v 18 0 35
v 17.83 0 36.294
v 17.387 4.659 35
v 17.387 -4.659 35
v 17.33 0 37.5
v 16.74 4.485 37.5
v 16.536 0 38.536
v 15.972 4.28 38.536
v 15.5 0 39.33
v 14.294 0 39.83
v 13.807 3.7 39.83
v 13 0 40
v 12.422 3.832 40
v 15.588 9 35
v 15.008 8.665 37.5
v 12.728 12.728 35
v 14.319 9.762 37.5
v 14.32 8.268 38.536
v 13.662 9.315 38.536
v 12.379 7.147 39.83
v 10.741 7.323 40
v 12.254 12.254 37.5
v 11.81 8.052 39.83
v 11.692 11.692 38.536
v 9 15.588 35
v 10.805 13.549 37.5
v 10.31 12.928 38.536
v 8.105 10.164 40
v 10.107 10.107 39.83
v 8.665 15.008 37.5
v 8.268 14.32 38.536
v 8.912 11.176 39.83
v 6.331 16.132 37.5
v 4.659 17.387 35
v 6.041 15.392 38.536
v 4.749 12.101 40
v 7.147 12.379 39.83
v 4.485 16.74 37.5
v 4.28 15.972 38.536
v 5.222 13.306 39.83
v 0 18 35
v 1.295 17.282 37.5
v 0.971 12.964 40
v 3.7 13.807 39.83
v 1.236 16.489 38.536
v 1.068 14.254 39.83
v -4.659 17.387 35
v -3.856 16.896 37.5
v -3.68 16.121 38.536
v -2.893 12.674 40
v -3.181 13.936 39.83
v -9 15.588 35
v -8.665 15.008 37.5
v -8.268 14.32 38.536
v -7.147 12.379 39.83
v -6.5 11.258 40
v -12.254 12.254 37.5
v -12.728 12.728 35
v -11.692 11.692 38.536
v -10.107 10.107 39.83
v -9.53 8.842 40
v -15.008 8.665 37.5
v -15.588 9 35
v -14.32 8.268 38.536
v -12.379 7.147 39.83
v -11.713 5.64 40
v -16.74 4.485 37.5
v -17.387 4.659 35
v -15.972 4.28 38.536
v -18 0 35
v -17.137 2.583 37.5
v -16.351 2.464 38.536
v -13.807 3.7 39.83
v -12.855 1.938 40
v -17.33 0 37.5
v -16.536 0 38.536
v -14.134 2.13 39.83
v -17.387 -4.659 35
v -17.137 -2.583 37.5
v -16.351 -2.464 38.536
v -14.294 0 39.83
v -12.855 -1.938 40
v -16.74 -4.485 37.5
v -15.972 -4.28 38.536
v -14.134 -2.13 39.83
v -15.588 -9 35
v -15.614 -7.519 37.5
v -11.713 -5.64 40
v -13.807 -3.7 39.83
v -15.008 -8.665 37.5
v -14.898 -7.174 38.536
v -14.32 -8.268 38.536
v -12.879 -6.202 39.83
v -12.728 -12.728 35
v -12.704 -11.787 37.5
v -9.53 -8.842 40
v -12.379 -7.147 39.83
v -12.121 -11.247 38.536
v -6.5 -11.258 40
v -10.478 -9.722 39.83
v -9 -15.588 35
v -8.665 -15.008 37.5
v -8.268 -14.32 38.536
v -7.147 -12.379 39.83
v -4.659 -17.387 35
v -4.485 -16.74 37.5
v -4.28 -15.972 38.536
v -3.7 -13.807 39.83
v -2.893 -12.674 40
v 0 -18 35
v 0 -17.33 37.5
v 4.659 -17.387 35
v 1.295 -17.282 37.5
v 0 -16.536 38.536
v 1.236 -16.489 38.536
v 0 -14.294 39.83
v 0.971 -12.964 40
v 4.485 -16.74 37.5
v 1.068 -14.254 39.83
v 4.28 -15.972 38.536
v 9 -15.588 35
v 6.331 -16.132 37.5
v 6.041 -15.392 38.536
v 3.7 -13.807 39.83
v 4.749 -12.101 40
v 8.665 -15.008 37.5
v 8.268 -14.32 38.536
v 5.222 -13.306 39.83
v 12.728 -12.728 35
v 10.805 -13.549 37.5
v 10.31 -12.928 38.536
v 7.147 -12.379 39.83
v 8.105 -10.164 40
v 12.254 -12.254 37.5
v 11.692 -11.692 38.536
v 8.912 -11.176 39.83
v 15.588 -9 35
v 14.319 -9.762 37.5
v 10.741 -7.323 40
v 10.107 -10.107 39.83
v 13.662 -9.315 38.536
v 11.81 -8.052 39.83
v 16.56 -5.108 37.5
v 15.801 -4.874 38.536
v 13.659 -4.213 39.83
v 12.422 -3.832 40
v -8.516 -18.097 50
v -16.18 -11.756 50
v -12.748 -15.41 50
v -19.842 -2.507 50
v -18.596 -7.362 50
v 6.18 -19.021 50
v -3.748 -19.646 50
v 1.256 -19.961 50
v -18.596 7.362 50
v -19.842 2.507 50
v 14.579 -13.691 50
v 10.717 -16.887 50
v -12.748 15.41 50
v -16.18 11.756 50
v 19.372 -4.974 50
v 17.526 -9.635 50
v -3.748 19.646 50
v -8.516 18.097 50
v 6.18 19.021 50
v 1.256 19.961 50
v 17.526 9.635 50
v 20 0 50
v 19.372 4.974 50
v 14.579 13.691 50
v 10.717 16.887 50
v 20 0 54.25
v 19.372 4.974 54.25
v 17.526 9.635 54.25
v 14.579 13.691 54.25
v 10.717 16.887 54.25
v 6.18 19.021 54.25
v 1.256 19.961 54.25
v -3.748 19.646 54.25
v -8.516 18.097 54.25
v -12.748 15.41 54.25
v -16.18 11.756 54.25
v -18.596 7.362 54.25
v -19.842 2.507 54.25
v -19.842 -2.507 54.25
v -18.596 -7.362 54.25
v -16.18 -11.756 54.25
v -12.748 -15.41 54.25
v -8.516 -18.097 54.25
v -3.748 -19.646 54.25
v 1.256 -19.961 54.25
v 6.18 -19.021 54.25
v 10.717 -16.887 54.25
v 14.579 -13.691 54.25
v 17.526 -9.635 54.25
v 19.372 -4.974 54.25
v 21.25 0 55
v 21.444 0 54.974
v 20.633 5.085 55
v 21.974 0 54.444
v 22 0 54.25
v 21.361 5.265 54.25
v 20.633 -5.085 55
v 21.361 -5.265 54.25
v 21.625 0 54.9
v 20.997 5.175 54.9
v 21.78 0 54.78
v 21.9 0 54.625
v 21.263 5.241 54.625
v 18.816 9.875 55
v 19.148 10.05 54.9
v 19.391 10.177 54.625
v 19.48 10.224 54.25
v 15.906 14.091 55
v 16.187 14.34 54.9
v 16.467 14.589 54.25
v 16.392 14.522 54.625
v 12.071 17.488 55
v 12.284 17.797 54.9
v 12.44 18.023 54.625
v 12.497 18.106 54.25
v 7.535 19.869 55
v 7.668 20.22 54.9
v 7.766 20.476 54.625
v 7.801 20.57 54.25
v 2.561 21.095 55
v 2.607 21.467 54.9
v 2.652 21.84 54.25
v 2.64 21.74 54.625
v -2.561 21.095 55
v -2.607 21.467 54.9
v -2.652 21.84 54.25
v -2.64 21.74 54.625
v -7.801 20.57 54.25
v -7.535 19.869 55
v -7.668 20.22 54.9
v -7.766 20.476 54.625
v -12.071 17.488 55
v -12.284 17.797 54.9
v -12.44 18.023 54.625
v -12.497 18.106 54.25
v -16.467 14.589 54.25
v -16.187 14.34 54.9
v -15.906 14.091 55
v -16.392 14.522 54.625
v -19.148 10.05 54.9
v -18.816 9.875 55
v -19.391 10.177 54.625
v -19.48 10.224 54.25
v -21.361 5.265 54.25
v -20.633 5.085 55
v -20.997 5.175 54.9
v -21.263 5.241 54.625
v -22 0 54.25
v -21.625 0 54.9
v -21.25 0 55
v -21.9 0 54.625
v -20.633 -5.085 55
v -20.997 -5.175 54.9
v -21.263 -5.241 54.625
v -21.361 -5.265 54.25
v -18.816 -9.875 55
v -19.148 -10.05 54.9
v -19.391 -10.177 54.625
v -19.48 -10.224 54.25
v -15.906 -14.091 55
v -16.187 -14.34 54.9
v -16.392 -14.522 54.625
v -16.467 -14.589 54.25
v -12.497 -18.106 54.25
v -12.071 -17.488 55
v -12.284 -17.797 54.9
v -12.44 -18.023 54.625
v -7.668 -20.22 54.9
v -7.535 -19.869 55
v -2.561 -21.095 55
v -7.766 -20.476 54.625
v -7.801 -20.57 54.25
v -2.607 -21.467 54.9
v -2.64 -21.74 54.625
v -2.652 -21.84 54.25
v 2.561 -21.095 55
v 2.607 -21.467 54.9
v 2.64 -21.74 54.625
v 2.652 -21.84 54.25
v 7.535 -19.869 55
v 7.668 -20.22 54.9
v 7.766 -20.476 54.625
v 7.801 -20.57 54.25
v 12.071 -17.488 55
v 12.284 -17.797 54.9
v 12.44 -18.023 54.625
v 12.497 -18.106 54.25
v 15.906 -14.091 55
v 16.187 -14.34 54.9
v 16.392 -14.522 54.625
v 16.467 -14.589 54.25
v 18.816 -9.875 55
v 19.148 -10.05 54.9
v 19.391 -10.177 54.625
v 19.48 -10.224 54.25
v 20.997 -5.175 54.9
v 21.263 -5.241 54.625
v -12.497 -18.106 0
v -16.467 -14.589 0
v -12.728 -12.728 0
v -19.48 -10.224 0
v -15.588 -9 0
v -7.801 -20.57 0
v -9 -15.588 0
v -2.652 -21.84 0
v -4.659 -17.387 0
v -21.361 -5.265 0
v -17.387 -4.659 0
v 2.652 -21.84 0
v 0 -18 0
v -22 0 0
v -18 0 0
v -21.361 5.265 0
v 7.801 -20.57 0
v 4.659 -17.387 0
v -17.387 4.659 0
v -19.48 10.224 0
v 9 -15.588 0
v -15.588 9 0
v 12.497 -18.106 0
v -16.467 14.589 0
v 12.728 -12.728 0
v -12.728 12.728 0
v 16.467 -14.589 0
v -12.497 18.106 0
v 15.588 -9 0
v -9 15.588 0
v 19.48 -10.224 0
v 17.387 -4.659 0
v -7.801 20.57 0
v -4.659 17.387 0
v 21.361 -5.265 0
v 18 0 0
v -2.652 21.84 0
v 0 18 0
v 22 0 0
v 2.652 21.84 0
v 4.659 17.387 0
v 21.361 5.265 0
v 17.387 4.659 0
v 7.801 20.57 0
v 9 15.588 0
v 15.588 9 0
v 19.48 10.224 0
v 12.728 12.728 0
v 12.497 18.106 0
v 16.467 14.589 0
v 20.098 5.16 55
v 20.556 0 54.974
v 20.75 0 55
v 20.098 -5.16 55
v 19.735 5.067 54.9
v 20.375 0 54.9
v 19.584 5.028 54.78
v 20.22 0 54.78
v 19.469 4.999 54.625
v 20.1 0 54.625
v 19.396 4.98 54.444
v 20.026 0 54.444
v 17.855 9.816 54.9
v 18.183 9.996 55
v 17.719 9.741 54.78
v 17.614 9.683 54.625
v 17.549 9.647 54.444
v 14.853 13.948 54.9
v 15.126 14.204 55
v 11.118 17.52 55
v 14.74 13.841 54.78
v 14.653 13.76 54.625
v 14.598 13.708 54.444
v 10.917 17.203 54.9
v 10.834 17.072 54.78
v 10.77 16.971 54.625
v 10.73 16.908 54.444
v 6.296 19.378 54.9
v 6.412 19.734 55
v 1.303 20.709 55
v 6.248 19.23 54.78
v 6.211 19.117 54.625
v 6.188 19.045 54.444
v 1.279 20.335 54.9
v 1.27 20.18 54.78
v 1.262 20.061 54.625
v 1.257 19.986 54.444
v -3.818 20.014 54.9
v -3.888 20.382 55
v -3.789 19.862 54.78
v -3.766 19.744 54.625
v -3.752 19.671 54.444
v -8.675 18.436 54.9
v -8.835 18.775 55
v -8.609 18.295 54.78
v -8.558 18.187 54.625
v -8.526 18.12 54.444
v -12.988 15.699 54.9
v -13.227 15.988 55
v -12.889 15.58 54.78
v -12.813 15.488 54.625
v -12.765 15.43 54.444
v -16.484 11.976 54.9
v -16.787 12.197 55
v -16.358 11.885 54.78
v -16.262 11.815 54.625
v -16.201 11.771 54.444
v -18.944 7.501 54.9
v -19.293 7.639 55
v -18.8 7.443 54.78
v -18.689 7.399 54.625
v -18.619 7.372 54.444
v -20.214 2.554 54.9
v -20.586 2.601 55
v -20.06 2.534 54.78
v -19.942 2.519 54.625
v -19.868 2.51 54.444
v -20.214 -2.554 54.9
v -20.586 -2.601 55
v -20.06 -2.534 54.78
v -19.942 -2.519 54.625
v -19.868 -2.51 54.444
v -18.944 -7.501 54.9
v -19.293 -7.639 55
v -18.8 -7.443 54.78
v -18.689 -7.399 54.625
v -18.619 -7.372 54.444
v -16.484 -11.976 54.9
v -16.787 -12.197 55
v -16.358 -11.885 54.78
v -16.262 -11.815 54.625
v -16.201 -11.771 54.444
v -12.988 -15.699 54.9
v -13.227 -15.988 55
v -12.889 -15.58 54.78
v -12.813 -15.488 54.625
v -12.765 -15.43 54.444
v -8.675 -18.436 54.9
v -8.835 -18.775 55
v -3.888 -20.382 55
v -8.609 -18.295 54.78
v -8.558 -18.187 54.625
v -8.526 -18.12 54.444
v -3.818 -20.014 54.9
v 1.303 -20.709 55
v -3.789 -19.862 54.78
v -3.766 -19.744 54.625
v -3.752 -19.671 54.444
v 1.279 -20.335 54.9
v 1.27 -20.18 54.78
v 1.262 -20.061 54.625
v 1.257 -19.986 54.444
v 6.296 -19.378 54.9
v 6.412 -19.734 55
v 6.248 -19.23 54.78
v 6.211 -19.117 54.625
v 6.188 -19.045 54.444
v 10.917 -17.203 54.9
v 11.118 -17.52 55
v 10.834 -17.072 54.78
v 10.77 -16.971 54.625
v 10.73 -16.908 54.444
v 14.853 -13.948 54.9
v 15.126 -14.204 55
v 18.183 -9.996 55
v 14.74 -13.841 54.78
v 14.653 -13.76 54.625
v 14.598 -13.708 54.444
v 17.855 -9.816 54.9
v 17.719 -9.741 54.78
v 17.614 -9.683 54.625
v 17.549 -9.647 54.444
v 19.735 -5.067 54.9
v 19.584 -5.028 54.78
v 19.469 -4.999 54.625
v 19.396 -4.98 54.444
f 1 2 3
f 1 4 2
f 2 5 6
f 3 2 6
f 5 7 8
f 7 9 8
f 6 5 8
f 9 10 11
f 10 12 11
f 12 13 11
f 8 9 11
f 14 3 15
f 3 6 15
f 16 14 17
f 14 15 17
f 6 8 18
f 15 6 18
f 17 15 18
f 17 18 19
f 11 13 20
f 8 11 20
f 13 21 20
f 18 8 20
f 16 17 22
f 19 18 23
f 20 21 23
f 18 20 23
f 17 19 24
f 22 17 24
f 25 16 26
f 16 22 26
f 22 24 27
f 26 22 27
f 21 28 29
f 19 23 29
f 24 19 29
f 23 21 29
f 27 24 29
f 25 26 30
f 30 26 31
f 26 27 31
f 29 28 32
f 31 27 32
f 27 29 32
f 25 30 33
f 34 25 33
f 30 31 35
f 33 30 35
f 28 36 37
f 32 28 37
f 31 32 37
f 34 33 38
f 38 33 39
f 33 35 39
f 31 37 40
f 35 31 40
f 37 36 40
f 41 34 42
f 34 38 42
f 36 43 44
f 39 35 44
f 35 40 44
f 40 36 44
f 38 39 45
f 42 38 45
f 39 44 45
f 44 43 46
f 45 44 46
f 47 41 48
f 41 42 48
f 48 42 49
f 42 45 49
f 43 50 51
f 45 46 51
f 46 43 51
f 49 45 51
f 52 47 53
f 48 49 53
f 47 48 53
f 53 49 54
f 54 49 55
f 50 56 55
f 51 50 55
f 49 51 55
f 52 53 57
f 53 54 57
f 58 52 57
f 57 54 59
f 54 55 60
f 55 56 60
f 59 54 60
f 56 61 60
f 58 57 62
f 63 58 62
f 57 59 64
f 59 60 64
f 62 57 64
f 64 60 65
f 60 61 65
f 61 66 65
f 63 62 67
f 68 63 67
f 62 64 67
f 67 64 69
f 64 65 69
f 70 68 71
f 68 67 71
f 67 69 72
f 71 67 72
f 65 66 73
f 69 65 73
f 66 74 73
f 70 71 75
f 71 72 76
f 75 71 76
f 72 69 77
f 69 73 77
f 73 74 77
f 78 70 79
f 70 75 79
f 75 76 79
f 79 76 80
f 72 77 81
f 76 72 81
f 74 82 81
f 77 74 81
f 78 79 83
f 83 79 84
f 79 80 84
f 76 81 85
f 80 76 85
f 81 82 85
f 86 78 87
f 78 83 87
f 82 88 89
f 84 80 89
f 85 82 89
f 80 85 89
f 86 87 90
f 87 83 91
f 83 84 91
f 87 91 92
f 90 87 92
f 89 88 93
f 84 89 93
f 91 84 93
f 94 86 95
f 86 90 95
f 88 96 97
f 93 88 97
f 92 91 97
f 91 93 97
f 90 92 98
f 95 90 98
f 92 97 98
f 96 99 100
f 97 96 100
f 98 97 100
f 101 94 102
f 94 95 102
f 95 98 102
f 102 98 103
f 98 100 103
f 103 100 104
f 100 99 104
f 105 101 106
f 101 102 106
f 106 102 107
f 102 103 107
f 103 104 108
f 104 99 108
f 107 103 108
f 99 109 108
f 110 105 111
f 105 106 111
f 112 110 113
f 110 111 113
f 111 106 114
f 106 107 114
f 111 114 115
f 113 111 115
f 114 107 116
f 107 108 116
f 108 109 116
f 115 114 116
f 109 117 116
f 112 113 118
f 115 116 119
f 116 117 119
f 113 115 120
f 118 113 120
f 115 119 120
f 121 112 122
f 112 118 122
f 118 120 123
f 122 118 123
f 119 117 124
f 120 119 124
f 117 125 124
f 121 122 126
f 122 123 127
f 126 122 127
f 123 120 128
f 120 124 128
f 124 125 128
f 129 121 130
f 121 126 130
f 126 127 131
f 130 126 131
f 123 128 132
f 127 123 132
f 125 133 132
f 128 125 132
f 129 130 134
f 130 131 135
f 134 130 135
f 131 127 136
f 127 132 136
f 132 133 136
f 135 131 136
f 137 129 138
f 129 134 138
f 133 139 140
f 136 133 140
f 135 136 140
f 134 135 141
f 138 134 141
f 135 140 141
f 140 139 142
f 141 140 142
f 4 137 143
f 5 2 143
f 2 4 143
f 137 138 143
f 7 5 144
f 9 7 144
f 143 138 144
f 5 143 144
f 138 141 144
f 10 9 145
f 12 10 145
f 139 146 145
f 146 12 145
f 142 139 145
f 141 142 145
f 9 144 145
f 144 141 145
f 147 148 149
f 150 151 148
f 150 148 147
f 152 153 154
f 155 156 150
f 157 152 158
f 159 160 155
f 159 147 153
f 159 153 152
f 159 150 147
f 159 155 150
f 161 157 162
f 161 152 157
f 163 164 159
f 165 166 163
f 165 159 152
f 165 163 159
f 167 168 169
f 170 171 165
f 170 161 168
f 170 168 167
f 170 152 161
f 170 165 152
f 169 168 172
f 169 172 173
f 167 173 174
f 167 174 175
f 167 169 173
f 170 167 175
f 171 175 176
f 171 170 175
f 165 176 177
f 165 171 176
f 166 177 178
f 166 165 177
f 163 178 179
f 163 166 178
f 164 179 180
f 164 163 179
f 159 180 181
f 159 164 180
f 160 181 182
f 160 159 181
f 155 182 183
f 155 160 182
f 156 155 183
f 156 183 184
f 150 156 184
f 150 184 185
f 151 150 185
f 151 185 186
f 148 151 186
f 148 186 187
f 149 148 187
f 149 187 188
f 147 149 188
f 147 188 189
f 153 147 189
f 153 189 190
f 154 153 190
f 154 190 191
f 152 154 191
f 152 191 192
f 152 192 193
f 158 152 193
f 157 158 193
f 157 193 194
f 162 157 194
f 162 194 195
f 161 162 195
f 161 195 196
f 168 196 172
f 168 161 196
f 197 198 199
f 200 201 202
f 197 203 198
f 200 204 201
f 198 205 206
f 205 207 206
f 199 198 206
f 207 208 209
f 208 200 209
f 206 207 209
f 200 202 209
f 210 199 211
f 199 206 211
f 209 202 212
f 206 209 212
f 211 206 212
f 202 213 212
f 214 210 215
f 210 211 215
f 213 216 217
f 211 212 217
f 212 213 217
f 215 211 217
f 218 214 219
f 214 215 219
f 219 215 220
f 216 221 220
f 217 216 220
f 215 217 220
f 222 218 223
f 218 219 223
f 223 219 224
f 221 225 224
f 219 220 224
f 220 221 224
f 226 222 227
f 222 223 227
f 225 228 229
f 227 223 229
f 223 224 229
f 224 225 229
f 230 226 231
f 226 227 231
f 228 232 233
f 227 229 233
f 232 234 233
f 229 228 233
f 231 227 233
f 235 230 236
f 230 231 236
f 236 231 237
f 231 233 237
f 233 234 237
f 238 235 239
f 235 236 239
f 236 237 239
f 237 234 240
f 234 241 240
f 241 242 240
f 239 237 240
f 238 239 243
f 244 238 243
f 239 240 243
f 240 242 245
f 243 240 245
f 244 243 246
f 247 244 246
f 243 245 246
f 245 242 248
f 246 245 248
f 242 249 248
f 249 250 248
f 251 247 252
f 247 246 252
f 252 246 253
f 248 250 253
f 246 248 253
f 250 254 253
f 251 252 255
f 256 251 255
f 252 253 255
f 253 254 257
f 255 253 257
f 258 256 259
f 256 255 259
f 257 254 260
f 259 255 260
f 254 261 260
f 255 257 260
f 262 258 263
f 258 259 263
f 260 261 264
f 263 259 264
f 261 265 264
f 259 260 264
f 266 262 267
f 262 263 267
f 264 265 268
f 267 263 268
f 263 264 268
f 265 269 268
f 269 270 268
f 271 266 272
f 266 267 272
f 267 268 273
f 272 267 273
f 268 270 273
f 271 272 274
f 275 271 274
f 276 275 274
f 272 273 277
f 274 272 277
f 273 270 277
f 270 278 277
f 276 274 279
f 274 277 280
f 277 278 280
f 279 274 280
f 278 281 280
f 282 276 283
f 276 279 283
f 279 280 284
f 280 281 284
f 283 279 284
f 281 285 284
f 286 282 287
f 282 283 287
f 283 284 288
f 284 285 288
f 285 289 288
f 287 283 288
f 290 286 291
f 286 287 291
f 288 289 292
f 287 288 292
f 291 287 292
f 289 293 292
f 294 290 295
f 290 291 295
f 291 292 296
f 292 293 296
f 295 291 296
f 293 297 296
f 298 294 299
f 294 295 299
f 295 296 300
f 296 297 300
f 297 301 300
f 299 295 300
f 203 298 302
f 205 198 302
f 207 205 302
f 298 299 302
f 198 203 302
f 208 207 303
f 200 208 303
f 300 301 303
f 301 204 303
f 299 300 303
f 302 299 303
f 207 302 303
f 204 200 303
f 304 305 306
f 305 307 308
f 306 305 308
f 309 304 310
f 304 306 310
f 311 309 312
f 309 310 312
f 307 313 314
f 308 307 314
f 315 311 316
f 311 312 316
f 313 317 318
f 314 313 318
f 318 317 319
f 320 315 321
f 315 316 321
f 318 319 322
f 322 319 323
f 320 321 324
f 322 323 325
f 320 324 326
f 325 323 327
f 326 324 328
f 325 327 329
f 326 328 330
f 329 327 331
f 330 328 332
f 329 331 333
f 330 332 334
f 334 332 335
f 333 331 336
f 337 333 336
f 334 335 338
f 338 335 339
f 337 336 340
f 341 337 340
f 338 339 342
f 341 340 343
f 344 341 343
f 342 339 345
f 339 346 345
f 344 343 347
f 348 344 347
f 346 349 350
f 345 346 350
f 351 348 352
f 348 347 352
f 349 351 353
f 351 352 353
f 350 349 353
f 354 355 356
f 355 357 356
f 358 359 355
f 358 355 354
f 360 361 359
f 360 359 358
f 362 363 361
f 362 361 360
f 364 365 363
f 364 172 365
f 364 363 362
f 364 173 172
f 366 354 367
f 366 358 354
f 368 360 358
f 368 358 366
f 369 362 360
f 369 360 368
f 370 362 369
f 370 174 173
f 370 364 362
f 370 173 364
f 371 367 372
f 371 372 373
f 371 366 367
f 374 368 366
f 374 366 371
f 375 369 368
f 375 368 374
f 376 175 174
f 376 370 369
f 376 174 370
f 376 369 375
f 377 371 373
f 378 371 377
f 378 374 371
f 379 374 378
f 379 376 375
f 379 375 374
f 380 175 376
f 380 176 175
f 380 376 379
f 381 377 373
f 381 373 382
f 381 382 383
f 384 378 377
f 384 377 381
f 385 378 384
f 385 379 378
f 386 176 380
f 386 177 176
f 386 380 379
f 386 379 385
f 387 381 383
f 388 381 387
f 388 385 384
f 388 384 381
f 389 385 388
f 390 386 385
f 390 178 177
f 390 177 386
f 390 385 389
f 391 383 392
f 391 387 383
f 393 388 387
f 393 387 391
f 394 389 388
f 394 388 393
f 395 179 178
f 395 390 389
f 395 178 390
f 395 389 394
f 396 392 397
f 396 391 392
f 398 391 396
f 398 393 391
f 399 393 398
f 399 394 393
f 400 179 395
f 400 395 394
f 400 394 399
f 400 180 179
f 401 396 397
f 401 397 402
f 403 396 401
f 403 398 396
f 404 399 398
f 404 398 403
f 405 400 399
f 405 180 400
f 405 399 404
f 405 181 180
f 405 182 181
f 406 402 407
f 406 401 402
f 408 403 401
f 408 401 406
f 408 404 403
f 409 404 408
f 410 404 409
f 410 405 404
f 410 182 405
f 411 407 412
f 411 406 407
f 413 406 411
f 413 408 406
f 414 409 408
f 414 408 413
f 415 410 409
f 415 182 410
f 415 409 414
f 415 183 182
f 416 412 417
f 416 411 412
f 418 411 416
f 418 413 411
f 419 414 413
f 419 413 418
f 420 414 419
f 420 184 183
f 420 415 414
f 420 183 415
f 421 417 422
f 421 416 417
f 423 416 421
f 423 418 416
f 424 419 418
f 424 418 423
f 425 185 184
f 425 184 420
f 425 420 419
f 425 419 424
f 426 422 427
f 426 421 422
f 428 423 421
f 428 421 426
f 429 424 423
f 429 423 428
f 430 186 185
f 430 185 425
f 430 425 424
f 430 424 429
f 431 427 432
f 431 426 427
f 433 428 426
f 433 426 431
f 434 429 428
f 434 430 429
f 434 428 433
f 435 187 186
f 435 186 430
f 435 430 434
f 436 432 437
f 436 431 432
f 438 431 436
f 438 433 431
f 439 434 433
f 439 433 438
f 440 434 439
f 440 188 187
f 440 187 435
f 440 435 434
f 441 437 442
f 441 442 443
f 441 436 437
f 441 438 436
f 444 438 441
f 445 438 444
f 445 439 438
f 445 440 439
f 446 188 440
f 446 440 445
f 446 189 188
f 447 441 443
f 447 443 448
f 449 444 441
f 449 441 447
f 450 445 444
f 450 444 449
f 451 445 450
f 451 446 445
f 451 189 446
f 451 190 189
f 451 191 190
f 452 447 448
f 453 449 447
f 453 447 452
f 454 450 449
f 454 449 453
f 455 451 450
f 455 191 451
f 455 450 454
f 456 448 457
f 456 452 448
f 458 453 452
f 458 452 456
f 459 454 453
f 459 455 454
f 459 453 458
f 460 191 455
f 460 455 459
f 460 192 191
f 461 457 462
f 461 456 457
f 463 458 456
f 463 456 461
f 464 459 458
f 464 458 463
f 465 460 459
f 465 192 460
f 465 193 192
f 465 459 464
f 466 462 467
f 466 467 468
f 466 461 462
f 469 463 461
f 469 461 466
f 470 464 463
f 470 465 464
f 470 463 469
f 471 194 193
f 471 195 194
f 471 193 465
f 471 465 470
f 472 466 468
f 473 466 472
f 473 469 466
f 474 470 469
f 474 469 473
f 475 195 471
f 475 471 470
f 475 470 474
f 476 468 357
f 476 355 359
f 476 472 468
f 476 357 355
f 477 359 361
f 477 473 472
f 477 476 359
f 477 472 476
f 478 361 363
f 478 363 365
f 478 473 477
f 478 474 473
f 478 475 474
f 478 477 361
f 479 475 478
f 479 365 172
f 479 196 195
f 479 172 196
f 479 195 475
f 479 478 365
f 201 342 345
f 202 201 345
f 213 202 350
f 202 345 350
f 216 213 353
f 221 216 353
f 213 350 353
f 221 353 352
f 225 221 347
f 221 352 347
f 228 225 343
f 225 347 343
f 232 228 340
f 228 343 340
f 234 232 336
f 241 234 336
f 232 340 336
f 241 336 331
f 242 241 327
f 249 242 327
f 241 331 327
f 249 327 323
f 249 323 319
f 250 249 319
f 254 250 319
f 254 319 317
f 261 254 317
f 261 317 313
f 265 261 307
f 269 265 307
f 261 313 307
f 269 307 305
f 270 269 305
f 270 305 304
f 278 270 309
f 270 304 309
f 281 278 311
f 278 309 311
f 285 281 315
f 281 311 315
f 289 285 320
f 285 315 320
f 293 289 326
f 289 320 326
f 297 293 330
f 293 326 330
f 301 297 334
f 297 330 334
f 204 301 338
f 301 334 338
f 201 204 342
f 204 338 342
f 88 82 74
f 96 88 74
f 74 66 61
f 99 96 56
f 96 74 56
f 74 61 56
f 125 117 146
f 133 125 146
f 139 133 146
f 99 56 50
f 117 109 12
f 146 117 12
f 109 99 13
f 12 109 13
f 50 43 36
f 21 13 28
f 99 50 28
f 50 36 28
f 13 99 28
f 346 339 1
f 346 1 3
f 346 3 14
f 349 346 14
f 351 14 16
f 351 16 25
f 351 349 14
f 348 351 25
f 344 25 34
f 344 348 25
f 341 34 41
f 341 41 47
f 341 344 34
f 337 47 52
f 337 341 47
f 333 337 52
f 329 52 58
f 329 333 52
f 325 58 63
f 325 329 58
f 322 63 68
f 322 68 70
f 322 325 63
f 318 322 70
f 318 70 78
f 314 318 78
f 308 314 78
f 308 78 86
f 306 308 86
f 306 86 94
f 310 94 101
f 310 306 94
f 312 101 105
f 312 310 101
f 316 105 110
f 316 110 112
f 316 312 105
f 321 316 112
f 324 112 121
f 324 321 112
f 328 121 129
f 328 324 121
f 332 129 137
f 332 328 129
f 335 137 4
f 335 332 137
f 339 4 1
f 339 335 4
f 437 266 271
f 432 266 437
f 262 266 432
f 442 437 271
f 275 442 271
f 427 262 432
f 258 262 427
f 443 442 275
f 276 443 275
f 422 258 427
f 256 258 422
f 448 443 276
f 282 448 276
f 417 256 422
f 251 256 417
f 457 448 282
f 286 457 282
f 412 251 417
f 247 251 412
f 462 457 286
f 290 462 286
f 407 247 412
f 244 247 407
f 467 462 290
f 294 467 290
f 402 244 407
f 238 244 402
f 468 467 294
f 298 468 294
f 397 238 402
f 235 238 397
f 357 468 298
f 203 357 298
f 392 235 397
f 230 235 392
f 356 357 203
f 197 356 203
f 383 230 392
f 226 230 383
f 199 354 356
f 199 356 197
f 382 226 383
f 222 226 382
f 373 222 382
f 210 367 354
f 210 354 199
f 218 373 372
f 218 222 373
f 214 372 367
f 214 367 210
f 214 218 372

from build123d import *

# Parameters (mm, degrees)
F0_R     = 20
F0_R_2   = 18
F1_DEPTH = 50
F0_R_3   = 22
F2_DEPTH = 55
F3_DEPTH = 40
F4_R     = 0.75
F5_R     = 0.75
F6_R     = 5


with BuildPart() as f1:
    # F0 (on Top) → F1 (new body)
    with BuildSketch(Plane.XY):
        Circle(F0_R)
        Circle(F0_R_2, mode=Mode.SUBTRACT)
        Circle(F0_R_2)
    extrude(amount=F1_DEPTH)

    # F0 (on Top) → F2 (join)
    with BuildSketch(Plane.XY):
        Circle(F0_R_3)
        Circle(F0_R, mode=Mode.SUBTRACT)
    extrude(amount=F2_DEPTH)

    # F0 (on Top) → F3 (cut)
    with BuildSketch(Plane.XY):
        Circle(F0_R_2)
    extrude(amount=F3_DEPTH, mode=Mode.SUBTRACT)

    # F4
    f4_edges = [f1.edges().sort_by_distance(p)[0] for p in [
        (-20, 0, 55),
    ]]
    fillet(f4_edges, radius=F4_R)

    # F5
    f5_edges = [f1.edges().sort_by_distance(p)[0] for p in [
        (-22, 0, 55),
    ]]
    fillet(f5_edges, radius=F5_R)

    # F6
    f6_edges = [f1.edges().sort_by_distance(p)[0] for p in [
        (-18, 0, 40),
    ]]
    fillet(f6_edges, radius=F6_R)


solid = f1.part
